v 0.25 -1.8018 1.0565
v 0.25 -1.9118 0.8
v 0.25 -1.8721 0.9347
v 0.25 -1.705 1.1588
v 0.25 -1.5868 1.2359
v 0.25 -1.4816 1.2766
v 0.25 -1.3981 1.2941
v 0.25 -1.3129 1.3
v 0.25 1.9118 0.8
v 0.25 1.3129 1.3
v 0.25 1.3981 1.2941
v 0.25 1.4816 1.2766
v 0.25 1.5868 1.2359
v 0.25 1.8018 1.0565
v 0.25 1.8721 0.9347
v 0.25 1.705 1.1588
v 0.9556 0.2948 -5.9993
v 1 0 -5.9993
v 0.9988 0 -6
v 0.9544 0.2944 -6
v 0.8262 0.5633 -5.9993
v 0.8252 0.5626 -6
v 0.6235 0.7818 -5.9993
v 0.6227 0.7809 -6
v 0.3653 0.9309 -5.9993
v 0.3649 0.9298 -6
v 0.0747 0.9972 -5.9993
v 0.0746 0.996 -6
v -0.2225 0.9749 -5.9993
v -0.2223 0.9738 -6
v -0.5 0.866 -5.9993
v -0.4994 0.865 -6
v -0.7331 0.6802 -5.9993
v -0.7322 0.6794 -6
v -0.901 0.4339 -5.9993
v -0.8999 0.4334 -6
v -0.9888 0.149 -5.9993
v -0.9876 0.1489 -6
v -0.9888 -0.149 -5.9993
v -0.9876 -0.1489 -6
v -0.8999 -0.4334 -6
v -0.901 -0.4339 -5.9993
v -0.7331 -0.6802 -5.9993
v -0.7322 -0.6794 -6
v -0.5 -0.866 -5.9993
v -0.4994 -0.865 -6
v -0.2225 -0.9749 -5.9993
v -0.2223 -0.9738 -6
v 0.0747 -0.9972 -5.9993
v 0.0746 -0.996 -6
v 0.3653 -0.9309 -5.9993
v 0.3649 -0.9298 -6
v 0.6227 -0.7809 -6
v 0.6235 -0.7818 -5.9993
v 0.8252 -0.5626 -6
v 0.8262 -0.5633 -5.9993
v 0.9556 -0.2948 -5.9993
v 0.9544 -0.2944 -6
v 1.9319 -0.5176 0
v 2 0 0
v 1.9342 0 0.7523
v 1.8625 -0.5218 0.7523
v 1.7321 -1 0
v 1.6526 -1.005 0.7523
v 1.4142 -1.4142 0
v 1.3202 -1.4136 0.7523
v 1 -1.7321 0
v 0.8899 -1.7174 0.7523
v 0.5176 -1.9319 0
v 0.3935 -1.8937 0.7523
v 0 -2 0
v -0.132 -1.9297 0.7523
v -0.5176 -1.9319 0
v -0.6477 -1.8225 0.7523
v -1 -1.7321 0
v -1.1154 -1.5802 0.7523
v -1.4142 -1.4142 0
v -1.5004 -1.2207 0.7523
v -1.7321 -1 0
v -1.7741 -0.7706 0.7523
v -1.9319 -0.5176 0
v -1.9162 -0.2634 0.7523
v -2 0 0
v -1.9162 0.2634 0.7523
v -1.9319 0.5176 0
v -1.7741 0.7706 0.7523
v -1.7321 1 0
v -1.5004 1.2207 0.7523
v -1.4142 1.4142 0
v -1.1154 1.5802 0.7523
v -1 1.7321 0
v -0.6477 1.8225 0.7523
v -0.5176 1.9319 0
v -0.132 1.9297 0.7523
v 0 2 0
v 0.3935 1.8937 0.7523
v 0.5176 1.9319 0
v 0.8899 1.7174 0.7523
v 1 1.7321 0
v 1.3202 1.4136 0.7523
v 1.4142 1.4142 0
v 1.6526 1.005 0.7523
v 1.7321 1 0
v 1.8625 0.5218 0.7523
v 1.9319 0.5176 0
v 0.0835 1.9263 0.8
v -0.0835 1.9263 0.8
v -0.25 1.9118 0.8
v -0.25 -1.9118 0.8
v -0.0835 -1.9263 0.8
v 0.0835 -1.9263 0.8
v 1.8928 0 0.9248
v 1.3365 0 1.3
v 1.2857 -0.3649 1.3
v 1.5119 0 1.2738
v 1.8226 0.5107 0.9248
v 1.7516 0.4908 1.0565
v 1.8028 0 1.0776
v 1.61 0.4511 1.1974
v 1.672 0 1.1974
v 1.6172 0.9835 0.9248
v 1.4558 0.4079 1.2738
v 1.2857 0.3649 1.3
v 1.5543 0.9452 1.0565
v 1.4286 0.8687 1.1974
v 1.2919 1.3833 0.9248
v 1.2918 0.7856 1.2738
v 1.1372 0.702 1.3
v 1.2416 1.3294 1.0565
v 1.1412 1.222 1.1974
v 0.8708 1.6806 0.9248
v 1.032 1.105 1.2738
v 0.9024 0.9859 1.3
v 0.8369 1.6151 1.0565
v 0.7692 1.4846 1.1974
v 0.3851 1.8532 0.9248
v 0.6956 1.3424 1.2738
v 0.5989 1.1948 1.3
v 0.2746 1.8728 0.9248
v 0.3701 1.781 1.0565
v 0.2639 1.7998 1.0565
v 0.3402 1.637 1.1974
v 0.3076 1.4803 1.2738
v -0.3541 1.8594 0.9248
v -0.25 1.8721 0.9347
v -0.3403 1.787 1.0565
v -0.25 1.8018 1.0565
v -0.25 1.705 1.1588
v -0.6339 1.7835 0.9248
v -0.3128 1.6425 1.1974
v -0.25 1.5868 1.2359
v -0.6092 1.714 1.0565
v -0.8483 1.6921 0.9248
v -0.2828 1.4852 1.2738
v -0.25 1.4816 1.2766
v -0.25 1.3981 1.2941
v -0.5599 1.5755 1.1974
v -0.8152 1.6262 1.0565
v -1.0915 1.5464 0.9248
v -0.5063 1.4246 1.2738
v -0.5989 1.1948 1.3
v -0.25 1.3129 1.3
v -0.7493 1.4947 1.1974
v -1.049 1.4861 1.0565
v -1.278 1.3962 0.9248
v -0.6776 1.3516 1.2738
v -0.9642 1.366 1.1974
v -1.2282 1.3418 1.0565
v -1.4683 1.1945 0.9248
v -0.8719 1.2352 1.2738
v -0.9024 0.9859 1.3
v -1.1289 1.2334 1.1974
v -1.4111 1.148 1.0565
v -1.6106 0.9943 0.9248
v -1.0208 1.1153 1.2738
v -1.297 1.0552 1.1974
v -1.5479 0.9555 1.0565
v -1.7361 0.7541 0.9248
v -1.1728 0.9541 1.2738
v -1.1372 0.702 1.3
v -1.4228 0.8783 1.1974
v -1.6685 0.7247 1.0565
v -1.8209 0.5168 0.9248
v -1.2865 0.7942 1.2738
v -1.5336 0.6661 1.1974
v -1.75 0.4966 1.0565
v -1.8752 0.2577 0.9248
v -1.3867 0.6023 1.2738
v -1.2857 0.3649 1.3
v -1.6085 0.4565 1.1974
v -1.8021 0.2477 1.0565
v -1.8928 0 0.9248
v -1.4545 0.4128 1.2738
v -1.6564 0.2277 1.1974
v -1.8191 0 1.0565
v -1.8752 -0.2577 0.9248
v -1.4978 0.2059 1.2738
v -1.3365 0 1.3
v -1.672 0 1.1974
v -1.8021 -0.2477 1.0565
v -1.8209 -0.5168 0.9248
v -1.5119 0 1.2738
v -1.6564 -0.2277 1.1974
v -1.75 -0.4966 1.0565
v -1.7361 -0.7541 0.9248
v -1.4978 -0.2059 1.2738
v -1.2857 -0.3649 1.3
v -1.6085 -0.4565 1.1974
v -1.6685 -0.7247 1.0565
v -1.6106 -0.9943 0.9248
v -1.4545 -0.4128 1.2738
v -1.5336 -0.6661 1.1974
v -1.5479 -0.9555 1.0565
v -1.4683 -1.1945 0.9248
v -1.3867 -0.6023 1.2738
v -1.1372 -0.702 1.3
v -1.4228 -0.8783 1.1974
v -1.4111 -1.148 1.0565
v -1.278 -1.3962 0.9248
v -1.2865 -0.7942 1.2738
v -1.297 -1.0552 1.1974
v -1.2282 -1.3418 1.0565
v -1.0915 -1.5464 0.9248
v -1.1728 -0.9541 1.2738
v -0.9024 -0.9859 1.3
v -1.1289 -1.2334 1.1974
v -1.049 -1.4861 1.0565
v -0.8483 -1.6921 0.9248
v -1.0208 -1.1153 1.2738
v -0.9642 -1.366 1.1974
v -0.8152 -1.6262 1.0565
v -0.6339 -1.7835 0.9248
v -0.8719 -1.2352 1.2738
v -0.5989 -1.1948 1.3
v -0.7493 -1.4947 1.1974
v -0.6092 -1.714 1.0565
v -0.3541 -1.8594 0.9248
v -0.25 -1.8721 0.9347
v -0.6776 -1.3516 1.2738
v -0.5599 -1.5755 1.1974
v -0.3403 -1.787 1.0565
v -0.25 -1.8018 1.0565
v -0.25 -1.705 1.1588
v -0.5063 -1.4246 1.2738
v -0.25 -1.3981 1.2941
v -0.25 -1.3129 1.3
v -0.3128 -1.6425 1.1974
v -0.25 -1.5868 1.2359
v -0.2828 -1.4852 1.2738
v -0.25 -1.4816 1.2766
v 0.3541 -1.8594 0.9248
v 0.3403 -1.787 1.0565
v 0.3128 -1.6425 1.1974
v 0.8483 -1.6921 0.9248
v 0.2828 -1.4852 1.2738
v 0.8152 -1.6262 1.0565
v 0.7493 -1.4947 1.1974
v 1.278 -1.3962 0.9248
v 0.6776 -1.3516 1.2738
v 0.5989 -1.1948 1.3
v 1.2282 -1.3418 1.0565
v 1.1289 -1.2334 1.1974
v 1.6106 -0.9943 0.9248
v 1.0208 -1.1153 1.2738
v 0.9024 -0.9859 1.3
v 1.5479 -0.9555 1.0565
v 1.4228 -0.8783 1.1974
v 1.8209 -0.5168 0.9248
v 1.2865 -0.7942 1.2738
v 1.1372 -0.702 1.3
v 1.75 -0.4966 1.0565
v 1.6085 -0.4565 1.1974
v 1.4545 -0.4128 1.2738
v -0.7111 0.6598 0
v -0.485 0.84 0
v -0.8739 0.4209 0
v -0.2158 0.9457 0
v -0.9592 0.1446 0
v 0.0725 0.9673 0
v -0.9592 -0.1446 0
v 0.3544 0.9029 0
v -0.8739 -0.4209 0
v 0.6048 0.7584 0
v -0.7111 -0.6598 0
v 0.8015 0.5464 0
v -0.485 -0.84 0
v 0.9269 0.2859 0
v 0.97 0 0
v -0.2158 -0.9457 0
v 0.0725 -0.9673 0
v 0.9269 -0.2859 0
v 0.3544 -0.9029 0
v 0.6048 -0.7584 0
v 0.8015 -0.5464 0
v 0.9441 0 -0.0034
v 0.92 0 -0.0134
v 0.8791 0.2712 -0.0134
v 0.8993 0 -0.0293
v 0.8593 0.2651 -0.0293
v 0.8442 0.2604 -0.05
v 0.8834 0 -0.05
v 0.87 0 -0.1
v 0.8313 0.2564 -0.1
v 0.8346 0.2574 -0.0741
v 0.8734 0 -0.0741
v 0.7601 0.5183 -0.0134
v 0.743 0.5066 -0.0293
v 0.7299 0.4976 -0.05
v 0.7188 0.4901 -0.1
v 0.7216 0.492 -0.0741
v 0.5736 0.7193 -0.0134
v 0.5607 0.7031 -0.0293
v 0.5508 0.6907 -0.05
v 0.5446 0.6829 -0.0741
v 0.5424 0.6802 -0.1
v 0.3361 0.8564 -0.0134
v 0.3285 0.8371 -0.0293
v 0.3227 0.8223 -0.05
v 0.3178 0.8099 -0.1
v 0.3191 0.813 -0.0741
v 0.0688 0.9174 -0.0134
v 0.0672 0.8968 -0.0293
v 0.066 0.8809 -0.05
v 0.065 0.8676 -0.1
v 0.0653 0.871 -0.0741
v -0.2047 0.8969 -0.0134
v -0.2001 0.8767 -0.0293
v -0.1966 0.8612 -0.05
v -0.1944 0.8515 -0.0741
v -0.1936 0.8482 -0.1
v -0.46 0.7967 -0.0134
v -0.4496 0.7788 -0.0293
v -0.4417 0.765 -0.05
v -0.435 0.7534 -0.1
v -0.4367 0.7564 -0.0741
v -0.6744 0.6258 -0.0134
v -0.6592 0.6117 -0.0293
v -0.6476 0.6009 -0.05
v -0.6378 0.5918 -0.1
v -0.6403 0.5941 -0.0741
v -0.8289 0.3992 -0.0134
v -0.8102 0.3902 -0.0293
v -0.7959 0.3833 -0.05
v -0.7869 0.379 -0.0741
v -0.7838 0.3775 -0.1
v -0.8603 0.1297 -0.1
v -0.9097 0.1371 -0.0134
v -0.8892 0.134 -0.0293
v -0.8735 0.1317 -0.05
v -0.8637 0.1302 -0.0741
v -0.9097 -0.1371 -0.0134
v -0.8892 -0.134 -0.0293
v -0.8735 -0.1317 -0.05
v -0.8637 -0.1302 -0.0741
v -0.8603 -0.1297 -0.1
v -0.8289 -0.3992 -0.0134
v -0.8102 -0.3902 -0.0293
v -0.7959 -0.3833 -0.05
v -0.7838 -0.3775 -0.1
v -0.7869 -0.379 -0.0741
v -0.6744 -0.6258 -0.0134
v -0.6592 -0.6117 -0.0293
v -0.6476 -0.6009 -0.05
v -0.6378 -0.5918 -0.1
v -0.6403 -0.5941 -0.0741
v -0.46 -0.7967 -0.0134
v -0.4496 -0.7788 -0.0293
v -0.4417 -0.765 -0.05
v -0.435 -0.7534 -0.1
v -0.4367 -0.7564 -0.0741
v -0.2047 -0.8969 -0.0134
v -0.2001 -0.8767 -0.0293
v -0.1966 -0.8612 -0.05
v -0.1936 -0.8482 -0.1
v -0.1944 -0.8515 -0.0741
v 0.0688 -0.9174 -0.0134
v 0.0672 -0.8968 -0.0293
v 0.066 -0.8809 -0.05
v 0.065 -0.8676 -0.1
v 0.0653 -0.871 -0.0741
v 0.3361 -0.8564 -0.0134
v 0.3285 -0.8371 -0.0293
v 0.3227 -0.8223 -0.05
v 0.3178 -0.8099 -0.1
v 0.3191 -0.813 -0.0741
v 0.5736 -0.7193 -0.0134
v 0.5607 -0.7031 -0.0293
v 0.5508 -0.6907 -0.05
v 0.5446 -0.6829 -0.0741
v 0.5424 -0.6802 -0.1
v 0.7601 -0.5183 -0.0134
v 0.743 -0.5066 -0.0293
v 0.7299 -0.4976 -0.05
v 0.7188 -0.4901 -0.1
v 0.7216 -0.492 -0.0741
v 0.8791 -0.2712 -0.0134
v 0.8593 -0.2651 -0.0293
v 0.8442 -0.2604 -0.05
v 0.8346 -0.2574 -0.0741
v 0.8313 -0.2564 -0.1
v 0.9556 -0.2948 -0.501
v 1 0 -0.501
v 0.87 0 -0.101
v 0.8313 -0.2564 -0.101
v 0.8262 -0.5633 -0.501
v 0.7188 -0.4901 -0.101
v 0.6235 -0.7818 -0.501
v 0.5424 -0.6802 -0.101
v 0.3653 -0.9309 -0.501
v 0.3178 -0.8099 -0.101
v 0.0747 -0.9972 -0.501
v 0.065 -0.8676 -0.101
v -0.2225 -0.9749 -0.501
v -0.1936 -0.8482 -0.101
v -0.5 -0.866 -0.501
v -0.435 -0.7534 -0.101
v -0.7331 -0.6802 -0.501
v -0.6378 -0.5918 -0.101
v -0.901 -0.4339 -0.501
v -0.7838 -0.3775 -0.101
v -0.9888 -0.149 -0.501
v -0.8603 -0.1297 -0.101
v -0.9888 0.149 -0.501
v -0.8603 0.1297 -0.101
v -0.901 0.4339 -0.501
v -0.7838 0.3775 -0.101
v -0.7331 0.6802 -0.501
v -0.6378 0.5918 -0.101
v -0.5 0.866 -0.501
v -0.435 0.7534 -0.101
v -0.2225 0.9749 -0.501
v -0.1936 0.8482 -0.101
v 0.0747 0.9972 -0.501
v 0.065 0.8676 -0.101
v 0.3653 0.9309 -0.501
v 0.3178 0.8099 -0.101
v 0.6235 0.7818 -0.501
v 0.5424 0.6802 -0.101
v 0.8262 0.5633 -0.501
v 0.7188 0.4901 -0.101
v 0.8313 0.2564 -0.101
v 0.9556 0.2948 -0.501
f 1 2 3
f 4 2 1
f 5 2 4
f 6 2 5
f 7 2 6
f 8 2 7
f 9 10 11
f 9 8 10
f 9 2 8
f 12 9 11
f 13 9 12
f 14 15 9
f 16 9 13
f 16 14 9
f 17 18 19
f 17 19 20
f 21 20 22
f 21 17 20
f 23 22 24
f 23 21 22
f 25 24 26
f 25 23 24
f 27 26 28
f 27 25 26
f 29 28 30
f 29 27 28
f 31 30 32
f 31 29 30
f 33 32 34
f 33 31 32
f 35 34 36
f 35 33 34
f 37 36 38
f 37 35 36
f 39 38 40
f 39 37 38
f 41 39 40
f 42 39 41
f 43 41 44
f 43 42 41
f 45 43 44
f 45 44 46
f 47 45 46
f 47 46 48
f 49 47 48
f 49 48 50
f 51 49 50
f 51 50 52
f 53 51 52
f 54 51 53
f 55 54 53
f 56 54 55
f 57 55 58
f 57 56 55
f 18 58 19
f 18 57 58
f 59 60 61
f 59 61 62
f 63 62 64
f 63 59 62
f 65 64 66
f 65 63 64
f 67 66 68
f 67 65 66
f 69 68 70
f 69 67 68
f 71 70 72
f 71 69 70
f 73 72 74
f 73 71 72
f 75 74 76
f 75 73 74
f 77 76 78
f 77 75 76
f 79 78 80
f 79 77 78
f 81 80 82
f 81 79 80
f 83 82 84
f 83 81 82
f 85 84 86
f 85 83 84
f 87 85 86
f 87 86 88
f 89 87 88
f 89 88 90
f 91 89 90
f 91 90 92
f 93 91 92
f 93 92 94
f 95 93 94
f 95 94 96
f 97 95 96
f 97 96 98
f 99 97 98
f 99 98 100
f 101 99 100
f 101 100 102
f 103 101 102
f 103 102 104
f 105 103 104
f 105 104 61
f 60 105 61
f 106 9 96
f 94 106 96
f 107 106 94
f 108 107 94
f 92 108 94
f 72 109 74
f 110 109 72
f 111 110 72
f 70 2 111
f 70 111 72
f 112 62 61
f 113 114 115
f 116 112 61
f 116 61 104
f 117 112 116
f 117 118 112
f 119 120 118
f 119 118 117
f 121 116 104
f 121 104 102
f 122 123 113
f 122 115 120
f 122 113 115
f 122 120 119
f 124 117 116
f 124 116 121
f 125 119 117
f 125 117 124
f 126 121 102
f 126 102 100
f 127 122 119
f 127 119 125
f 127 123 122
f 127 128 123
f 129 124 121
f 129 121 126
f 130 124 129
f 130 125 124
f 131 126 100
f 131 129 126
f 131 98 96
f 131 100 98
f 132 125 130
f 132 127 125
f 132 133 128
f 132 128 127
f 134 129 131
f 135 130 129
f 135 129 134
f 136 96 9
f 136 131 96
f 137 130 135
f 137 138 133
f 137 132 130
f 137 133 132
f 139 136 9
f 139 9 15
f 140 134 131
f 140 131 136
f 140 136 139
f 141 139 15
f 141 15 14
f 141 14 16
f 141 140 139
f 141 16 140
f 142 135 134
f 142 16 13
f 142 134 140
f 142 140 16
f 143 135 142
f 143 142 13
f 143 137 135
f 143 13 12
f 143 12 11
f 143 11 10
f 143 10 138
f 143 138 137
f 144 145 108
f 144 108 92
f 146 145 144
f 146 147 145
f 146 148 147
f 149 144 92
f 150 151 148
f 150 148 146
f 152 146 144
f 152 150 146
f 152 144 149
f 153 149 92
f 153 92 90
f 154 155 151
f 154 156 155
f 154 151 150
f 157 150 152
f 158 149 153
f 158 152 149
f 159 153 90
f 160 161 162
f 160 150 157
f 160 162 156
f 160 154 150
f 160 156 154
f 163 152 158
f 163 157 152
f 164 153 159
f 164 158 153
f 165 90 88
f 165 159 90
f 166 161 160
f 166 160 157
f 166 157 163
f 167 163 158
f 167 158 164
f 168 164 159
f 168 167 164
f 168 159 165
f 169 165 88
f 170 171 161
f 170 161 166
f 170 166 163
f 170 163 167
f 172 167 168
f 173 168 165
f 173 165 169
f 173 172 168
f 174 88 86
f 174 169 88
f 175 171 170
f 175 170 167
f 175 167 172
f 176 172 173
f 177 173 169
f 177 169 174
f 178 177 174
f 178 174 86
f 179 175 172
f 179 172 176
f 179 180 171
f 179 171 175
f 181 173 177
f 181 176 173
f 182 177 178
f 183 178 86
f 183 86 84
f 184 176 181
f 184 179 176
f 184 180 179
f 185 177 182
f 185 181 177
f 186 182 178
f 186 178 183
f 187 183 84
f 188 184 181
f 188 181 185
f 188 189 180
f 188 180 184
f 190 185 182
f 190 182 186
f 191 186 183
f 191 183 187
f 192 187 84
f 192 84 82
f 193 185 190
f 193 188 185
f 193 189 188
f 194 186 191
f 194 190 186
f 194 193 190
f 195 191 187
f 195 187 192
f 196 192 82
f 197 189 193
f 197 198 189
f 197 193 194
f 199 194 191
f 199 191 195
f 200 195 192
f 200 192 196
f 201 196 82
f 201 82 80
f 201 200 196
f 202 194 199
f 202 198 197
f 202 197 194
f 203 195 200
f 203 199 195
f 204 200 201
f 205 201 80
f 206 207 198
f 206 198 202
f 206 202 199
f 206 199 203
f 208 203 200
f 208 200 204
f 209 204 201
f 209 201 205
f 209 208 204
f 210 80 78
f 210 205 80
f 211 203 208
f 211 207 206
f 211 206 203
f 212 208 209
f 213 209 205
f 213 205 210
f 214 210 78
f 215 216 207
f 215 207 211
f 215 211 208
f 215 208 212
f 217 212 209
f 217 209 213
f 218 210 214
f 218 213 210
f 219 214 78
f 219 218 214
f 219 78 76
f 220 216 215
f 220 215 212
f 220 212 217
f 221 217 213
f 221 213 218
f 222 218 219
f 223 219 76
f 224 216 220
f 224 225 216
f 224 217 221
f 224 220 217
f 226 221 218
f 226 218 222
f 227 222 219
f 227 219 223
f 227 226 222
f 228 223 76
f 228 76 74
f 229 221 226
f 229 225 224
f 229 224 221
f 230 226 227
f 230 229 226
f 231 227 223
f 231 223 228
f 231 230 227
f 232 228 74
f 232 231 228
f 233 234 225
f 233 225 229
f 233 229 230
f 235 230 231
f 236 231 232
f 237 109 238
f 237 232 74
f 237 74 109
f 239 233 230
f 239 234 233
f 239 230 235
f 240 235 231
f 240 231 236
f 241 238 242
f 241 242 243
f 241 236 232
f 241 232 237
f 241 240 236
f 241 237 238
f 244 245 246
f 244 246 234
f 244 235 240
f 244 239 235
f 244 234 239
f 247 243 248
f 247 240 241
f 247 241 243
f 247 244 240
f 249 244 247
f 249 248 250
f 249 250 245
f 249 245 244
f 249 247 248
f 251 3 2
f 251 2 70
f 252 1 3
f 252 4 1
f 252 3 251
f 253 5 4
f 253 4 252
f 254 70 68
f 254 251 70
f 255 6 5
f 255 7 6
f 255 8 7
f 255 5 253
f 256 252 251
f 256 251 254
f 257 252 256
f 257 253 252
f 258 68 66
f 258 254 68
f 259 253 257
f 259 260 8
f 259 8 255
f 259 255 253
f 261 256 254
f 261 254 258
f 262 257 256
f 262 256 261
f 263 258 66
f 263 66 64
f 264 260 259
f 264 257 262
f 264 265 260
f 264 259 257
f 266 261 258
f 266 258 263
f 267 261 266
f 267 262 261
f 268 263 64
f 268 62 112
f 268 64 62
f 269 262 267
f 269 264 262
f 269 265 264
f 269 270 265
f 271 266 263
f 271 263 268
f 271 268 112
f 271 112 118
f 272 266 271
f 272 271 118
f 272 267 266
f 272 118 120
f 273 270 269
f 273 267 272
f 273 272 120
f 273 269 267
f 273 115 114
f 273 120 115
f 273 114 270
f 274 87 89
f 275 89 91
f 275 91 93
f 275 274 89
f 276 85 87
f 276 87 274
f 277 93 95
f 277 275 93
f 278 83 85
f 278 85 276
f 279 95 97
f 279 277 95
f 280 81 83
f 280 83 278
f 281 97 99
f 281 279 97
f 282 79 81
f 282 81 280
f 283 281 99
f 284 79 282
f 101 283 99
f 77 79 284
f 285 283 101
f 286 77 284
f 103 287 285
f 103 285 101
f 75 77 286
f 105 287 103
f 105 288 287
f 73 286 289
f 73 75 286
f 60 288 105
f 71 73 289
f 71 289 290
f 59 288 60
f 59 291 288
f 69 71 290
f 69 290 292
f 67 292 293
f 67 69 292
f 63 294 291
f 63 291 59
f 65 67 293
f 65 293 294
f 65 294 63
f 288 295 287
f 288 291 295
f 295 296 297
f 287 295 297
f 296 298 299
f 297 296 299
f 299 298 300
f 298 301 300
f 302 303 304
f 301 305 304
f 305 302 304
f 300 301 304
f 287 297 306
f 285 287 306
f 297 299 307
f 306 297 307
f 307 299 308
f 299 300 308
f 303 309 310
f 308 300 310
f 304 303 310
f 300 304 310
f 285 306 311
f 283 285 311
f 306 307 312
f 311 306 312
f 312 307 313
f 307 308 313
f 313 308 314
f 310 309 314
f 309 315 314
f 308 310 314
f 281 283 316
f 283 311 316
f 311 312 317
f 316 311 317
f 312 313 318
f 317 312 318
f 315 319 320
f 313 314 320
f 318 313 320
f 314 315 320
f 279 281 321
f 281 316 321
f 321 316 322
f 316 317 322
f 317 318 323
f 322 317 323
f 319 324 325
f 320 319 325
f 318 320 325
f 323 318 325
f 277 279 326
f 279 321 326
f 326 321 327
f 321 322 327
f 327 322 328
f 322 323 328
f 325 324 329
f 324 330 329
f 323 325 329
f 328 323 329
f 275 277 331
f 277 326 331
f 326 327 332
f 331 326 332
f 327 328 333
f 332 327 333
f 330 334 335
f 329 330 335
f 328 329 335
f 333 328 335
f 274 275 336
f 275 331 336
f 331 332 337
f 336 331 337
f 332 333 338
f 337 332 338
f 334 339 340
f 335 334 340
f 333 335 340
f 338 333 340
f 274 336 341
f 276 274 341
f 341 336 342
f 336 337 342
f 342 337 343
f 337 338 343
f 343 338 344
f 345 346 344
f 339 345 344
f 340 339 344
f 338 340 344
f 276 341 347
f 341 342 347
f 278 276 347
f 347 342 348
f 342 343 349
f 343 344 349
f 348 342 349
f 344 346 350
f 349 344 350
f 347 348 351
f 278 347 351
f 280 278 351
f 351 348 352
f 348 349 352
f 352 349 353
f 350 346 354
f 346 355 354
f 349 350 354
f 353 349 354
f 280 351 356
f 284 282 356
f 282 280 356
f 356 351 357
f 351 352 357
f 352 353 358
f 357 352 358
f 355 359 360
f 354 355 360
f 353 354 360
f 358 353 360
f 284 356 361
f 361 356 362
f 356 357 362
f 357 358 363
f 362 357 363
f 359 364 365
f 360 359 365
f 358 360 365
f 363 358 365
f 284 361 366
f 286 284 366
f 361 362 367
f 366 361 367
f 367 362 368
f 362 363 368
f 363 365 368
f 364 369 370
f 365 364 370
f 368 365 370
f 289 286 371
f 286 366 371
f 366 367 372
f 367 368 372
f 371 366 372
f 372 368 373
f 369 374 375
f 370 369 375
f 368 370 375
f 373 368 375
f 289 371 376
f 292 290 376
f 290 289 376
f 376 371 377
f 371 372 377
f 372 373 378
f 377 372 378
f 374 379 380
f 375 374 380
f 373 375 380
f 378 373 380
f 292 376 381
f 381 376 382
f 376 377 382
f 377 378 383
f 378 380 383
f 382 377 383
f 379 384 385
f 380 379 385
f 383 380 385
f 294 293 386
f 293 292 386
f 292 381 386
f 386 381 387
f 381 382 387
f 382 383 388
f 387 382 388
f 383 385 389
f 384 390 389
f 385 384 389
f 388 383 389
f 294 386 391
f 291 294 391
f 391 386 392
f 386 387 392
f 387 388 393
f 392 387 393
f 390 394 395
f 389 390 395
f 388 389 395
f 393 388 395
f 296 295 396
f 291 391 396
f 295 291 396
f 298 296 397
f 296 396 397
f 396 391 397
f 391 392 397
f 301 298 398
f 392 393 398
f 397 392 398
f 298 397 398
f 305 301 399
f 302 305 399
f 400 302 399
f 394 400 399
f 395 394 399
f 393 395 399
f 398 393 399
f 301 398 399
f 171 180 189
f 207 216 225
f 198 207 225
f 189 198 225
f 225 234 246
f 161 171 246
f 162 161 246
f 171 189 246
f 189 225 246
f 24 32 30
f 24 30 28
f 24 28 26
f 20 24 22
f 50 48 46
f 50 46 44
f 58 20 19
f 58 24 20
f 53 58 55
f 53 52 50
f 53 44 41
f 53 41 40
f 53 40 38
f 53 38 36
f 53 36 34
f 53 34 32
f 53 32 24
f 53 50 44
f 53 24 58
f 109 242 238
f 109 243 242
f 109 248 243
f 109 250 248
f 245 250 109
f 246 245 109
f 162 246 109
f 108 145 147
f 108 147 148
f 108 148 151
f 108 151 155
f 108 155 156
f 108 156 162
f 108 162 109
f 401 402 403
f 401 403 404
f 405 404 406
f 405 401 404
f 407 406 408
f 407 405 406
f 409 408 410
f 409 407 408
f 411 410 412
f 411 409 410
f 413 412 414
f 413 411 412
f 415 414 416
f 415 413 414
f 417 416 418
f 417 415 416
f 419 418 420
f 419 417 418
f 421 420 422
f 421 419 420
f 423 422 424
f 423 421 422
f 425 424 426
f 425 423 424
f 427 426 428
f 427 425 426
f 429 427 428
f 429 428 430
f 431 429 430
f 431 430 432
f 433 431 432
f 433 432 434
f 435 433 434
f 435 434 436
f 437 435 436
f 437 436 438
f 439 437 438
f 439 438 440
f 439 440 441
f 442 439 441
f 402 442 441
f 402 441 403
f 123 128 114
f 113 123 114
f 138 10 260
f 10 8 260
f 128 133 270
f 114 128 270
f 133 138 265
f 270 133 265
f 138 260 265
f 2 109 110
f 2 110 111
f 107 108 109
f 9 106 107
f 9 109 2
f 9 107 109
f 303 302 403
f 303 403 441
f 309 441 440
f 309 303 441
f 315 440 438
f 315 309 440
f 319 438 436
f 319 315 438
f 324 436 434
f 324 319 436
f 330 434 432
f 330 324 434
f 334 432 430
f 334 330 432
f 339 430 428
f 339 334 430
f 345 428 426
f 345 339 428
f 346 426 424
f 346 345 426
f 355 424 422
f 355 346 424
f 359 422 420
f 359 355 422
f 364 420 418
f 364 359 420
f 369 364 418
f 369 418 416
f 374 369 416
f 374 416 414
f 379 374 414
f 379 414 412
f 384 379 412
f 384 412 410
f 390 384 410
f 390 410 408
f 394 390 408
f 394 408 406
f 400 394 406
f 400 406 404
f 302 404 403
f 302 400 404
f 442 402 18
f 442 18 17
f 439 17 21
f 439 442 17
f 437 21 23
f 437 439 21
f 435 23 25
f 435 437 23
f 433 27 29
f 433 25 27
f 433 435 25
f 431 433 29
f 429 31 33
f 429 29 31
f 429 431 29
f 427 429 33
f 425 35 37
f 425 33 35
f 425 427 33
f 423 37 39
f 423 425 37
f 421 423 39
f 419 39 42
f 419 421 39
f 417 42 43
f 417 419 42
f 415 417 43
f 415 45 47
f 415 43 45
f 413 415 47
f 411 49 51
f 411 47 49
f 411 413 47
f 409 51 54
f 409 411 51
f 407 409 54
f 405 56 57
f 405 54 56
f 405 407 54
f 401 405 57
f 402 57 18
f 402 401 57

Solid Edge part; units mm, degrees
sketch "Sketch1" plane through (0, 0, 0) normal (0, -1, 0) x (1, 0, 0)
  line L0 (0, -6) -> (1, -6)
  line L1 (1, -6) -> (1, -0.501)
  line L2 (1, -0.501) -> (0.87, -0.101)
  line L3 (0.87, -0.101) -> (0.87, 0)
  line L4 (0.87, 0) -> (2, 0)
  line L5 (2, 0) -> (1.8863, 1.3)
  line L6 (1.8863, 1.3) -> (0, 1.3)
  dimension "D1" = 1
  dimension "D2" = 0.87
  dimension "D3" = 6
  dimension "D4" = 5.499
  dimension "D5" = 0.4
  dimension "D6" = 2
  dimension "D7" = 1.3
revolve "RevolvedProtrusion1" add sketch "Sketch1" angle 360 about axis through (0, 0, 6) along (0, 0, -1)
fillet "Round_1" radius 0.6 1 edges at (-1.8863, 0, 1.3)
sketch "Sketch2" plane through (0, 0, 0) normal (0, -1, 0) x (1, 0, 0)
  line L0 (-0.25, 1.3) -> (-0.25, 0.8)
  line L1 (-0.25, 0.8) -> (0.25, 0.8)
  line L2 (0.25, 0.8) -> (0.25, 1.3)
  line L3 (0.25, 1.3) -> (-0.25, 1.3)
  dimension "D1" = 0.5
  dimension "D2" = 0.5
  dimension "D3" = 1.3
extrude "ExtrudedCutout_1" cut sketch "Sketch2" along normal mid plane 4
cosmetic_thread "Thread_1" size "M2" thread depth 5.499
fillet "Round_2" radius 0.1 1 edges at (-0.87, 0, 0)
chamfer "Chamfer_1" distance 0.0012 angle 30 1 edges at (-1, 0, -6) measured on face at (0.6867, 0.6467, -6)
properties material "Steel"
